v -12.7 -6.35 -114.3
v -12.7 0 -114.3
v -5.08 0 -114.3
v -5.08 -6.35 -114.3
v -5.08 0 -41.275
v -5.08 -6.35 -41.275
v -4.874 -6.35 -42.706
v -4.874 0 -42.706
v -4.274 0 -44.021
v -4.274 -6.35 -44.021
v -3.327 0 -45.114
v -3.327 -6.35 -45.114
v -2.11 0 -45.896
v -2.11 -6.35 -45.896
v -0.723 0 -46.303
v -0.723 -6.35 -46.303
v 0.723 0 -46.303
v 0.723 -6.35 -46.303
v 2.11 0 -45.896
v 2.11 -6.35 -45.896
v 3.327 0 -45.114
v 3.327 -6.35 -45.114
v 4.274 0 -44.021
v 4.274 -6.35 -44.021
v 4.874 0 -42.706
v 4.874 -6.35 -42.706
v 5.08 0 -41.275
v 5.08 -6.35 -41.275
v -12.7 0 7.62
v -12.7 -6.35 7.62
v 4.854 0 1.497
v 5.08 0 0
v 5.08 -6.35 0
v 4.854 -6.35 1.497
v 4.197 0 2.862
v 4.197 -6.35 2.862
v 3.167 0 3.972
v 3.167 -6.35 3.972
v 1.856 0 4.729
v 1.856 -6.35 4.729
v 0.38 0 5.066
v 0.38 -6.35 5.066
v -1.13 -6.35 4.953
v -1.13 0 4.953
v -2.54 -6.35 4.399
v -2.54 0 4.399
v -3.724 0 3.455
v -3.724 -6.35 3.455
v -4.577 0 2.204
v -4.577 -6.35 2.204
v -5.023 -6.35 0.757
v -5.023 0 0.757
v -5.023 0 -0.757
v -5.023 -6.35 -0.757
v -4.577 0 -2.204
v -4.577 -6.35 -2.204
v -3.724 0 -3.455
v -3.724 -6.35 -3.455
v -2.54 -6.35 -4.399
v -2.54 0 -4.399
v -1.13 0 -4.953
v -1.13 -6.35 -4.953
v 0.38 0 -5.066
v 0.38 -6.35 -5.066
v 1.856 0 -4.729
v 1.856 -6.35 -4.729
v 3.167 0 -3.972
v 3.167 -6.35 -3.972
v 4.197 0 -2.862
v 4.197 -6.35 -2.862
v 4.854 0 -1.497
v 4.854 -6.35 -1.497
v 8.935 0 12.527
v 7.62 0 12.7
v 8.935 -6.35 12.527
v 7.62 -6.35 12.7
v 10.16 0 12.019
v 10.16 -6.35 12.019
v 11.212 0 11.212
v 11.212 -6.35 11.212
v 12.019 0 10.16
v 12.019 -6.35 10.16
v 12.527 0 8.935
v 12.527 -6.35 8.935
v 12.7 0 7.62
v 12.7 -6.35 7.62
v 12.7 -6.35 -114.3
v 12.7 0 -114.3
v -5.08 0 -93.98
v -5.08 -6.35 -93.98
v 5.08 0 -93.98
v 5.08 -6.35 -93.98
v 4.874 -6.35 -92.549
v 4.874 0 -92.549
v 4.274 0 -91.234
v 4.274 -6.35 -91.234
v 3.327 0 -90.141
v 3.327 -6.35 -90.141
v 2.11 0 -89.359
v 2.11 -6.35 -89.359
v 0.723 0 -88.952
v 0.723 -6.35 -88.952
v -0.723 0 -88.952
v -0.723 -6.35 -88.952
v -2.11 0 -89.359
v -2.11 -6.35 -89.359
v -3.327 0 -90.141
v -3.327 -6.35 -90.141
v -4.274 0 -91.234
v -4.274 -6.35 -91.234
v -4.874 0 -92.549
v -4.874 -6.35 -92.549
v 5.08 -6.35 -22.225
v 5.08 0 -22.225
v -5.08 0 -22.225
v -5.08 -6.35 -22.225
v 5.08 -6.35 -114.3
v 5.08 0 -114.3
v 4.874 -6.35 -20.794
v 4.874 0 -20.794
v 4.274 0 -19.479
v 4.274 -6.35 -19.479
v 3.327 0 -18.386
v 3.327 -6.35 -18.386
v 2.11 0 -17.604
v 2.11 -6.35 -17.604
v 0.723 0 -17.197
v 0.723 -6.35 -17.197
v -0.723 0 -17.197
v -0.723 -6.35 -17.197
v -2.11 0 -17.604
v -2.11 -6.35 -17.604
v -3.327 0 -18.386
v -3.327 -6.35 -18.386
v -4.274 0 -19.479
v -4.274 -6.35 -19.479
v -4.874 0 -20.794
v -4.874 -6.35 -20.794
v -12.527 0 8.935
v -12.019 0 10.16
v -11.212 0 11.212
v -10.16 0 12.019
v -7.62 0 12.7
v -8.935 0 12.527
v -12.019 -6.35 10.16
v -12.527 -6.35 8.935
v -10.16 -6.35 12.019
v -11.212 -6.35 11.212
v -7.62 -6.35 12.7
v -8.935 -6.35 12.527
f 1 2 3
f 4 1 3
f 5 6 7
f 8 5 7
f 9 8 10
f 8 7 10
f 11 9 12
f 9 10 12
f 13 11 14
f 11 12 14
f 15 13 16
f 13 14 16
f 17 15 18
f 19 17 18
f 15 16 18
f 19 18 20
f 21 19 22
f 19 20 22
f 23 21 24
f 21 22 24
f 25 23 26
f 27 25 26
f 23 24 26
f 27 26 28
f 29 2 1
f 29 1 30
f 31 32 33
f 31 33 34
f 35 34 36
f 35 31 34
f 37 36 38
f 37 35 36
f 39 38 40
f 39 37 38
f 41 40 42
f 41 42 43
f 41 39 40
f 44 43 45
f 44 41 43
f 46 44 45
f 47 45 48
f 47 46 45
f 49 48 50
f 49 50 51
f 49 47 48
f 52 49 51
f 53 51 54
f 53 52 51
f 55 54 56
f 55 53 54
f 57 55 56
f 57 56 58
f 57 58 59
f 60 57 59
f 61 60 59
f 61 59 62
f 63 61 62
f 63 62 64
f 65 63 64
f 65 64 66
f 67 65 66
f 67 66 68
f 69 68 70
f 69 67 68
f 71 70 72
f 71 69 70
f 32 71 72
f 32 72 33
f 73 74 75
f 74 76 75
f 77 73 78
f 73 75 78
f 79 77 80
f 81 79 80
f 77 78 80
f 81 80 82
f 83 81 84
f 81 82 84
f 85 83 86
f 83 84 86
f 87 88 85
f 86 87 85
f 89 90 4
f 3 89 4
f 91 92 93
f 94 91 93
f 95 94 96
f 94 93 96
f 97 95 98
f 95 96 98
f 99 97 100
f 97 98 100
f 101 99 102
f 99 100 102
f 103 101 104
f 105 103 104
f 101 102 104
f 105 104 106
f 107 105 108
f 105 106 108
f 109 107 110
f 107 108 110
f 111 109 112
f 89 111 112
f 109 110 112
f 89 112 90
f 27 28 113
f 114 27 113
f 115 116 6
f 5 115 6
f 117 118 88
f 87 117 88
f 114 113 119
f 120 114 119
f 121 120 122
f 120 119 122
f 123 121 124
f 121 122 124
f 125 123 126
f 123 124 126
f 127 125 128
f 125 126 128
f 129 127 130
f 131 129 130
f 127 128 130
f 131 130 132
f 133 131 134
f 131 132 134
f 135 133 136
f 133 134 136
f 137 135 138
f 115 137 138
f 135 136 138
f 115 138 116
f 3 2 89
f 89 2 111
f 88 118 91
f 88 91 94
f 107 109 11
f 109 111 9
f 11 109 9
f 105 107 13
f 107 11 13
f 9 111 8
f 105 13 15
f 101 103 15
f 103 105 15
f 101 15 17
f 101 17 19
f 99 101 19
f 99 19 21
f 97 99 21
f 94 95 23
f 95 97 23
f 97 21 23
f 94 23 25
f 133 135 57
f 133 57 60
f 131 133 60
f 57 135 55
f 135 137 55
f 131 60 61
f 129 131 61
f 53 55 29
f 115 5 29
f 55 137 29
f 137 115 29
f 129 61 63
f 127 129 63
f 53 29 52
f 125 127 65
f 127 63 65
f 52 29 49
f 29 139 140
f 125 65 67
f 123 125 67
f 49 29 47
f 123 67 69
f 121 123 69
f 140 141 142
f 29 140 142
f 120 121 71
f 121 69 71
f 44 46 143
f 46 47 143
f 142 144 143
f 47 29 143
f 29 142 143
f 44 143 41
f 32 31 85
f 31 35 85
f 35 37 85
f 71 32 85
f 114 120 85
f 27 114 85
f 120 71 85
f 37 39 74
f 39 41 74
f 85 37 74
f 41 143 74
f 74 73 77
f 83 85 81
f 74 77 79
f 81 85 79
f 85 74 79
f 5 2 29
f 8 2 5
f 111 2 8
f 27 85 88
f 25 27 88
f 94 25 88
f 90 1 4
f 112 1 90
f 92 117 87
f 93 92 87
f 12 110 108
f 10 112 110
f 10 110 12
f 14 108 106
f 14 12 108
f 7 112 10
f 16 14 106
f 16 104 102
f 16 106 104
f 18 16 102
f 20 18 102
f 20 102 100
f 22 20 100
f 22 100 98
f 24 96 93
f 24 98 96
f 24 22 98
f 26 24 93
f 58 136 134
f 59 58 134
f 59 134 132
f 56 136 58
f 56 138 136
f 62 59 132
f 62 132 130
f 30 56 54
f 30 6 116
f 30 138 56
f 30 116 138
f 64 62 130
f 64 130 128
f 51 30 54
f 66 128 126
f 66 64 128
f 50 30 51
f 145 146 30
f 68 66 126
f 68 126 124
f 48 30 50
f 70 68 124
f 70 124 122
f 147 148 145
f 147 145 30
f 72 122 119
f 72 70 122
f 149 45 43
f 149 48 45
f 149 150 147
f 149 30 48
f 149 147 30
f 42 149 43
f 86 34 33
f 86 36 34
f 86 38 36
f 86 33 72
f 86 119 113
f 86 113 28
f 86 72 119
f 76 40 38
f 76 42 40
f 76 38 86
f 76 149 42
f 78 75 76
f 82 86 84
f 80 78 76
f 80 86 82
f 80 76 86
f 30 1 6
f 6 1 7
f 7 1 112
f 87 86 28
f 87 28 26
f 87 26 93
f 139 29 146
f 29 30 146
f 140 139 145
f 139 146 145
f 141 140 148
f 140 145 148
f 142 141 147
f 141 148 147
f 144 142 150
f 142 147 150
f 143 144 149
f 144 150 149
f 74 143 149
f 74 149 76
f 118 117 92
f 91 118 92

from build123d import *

# Parameters (mm, degrees)
F0_W     = 25.4
F0_H     = 127
F0_R     = 5.08
F1_DEPTH = 6.35
F2_R     = 5.08
F4_DEPTH = 25.4
F6_DEPTH = 6.351


with BuildPart() as f1:
    # F0 (on Front) → F1 (new body)
    with BuildSketch(Plane.XZ):
        with Locations((0, -50.8)):
            Rectangle(F0_W, F0_H)
        Circle(F0_R, mode=Mode.SUBTRACT)
    extrude(amount=F1_DEPTH)

    # F2
    f2_edges = [f1.edges().sort_by_distance(p)[0] for p in [
        (12.7, -3.175, 12.7),
        (-12.7, -3.175, 12.7),
    ]]
    fillet(f2_edges, radius=F2_R)

    # F3 (on face) → F4 (cut)
    with BuildSketch(Plane.XZ.offset(6.35)):
        with BuildLine():
            ThreePointArc((-5.08, -41.275), (0, -46.355), (5.08, -41.275))
            Line((5.08, -41.275), (5.08, -22.225))
            ThreePointArc((5.08, -22.225), (0, -17.145), (-5.08, -22.225))
            Line((-5.08, -22.225), (-5.08, -41.275))
        make_face()
    extrude(amount=-F4_DEPTH, mode=Mode.SUBTRACT)

    # F5 (on face) → F6 (cut, through all)
    with BuildSketch(Plane.XZ.offset(6.35)):
        with BuildLine():
            Line((-5.08, -114.3), (5.08, -114.3))
            Line((5.08, -114.3), (5.08, -93.98))
            ThreePointArc((5.08, -93.98), (0, -88.9), (-5.08, -93.98))
            Line((-5.08, -93.98), (-5.08, -114.3))
        make_face()
    extrude(amount=-F6_DEPTH, mode=Mode.SUBTRACT)


solid = f1.part
